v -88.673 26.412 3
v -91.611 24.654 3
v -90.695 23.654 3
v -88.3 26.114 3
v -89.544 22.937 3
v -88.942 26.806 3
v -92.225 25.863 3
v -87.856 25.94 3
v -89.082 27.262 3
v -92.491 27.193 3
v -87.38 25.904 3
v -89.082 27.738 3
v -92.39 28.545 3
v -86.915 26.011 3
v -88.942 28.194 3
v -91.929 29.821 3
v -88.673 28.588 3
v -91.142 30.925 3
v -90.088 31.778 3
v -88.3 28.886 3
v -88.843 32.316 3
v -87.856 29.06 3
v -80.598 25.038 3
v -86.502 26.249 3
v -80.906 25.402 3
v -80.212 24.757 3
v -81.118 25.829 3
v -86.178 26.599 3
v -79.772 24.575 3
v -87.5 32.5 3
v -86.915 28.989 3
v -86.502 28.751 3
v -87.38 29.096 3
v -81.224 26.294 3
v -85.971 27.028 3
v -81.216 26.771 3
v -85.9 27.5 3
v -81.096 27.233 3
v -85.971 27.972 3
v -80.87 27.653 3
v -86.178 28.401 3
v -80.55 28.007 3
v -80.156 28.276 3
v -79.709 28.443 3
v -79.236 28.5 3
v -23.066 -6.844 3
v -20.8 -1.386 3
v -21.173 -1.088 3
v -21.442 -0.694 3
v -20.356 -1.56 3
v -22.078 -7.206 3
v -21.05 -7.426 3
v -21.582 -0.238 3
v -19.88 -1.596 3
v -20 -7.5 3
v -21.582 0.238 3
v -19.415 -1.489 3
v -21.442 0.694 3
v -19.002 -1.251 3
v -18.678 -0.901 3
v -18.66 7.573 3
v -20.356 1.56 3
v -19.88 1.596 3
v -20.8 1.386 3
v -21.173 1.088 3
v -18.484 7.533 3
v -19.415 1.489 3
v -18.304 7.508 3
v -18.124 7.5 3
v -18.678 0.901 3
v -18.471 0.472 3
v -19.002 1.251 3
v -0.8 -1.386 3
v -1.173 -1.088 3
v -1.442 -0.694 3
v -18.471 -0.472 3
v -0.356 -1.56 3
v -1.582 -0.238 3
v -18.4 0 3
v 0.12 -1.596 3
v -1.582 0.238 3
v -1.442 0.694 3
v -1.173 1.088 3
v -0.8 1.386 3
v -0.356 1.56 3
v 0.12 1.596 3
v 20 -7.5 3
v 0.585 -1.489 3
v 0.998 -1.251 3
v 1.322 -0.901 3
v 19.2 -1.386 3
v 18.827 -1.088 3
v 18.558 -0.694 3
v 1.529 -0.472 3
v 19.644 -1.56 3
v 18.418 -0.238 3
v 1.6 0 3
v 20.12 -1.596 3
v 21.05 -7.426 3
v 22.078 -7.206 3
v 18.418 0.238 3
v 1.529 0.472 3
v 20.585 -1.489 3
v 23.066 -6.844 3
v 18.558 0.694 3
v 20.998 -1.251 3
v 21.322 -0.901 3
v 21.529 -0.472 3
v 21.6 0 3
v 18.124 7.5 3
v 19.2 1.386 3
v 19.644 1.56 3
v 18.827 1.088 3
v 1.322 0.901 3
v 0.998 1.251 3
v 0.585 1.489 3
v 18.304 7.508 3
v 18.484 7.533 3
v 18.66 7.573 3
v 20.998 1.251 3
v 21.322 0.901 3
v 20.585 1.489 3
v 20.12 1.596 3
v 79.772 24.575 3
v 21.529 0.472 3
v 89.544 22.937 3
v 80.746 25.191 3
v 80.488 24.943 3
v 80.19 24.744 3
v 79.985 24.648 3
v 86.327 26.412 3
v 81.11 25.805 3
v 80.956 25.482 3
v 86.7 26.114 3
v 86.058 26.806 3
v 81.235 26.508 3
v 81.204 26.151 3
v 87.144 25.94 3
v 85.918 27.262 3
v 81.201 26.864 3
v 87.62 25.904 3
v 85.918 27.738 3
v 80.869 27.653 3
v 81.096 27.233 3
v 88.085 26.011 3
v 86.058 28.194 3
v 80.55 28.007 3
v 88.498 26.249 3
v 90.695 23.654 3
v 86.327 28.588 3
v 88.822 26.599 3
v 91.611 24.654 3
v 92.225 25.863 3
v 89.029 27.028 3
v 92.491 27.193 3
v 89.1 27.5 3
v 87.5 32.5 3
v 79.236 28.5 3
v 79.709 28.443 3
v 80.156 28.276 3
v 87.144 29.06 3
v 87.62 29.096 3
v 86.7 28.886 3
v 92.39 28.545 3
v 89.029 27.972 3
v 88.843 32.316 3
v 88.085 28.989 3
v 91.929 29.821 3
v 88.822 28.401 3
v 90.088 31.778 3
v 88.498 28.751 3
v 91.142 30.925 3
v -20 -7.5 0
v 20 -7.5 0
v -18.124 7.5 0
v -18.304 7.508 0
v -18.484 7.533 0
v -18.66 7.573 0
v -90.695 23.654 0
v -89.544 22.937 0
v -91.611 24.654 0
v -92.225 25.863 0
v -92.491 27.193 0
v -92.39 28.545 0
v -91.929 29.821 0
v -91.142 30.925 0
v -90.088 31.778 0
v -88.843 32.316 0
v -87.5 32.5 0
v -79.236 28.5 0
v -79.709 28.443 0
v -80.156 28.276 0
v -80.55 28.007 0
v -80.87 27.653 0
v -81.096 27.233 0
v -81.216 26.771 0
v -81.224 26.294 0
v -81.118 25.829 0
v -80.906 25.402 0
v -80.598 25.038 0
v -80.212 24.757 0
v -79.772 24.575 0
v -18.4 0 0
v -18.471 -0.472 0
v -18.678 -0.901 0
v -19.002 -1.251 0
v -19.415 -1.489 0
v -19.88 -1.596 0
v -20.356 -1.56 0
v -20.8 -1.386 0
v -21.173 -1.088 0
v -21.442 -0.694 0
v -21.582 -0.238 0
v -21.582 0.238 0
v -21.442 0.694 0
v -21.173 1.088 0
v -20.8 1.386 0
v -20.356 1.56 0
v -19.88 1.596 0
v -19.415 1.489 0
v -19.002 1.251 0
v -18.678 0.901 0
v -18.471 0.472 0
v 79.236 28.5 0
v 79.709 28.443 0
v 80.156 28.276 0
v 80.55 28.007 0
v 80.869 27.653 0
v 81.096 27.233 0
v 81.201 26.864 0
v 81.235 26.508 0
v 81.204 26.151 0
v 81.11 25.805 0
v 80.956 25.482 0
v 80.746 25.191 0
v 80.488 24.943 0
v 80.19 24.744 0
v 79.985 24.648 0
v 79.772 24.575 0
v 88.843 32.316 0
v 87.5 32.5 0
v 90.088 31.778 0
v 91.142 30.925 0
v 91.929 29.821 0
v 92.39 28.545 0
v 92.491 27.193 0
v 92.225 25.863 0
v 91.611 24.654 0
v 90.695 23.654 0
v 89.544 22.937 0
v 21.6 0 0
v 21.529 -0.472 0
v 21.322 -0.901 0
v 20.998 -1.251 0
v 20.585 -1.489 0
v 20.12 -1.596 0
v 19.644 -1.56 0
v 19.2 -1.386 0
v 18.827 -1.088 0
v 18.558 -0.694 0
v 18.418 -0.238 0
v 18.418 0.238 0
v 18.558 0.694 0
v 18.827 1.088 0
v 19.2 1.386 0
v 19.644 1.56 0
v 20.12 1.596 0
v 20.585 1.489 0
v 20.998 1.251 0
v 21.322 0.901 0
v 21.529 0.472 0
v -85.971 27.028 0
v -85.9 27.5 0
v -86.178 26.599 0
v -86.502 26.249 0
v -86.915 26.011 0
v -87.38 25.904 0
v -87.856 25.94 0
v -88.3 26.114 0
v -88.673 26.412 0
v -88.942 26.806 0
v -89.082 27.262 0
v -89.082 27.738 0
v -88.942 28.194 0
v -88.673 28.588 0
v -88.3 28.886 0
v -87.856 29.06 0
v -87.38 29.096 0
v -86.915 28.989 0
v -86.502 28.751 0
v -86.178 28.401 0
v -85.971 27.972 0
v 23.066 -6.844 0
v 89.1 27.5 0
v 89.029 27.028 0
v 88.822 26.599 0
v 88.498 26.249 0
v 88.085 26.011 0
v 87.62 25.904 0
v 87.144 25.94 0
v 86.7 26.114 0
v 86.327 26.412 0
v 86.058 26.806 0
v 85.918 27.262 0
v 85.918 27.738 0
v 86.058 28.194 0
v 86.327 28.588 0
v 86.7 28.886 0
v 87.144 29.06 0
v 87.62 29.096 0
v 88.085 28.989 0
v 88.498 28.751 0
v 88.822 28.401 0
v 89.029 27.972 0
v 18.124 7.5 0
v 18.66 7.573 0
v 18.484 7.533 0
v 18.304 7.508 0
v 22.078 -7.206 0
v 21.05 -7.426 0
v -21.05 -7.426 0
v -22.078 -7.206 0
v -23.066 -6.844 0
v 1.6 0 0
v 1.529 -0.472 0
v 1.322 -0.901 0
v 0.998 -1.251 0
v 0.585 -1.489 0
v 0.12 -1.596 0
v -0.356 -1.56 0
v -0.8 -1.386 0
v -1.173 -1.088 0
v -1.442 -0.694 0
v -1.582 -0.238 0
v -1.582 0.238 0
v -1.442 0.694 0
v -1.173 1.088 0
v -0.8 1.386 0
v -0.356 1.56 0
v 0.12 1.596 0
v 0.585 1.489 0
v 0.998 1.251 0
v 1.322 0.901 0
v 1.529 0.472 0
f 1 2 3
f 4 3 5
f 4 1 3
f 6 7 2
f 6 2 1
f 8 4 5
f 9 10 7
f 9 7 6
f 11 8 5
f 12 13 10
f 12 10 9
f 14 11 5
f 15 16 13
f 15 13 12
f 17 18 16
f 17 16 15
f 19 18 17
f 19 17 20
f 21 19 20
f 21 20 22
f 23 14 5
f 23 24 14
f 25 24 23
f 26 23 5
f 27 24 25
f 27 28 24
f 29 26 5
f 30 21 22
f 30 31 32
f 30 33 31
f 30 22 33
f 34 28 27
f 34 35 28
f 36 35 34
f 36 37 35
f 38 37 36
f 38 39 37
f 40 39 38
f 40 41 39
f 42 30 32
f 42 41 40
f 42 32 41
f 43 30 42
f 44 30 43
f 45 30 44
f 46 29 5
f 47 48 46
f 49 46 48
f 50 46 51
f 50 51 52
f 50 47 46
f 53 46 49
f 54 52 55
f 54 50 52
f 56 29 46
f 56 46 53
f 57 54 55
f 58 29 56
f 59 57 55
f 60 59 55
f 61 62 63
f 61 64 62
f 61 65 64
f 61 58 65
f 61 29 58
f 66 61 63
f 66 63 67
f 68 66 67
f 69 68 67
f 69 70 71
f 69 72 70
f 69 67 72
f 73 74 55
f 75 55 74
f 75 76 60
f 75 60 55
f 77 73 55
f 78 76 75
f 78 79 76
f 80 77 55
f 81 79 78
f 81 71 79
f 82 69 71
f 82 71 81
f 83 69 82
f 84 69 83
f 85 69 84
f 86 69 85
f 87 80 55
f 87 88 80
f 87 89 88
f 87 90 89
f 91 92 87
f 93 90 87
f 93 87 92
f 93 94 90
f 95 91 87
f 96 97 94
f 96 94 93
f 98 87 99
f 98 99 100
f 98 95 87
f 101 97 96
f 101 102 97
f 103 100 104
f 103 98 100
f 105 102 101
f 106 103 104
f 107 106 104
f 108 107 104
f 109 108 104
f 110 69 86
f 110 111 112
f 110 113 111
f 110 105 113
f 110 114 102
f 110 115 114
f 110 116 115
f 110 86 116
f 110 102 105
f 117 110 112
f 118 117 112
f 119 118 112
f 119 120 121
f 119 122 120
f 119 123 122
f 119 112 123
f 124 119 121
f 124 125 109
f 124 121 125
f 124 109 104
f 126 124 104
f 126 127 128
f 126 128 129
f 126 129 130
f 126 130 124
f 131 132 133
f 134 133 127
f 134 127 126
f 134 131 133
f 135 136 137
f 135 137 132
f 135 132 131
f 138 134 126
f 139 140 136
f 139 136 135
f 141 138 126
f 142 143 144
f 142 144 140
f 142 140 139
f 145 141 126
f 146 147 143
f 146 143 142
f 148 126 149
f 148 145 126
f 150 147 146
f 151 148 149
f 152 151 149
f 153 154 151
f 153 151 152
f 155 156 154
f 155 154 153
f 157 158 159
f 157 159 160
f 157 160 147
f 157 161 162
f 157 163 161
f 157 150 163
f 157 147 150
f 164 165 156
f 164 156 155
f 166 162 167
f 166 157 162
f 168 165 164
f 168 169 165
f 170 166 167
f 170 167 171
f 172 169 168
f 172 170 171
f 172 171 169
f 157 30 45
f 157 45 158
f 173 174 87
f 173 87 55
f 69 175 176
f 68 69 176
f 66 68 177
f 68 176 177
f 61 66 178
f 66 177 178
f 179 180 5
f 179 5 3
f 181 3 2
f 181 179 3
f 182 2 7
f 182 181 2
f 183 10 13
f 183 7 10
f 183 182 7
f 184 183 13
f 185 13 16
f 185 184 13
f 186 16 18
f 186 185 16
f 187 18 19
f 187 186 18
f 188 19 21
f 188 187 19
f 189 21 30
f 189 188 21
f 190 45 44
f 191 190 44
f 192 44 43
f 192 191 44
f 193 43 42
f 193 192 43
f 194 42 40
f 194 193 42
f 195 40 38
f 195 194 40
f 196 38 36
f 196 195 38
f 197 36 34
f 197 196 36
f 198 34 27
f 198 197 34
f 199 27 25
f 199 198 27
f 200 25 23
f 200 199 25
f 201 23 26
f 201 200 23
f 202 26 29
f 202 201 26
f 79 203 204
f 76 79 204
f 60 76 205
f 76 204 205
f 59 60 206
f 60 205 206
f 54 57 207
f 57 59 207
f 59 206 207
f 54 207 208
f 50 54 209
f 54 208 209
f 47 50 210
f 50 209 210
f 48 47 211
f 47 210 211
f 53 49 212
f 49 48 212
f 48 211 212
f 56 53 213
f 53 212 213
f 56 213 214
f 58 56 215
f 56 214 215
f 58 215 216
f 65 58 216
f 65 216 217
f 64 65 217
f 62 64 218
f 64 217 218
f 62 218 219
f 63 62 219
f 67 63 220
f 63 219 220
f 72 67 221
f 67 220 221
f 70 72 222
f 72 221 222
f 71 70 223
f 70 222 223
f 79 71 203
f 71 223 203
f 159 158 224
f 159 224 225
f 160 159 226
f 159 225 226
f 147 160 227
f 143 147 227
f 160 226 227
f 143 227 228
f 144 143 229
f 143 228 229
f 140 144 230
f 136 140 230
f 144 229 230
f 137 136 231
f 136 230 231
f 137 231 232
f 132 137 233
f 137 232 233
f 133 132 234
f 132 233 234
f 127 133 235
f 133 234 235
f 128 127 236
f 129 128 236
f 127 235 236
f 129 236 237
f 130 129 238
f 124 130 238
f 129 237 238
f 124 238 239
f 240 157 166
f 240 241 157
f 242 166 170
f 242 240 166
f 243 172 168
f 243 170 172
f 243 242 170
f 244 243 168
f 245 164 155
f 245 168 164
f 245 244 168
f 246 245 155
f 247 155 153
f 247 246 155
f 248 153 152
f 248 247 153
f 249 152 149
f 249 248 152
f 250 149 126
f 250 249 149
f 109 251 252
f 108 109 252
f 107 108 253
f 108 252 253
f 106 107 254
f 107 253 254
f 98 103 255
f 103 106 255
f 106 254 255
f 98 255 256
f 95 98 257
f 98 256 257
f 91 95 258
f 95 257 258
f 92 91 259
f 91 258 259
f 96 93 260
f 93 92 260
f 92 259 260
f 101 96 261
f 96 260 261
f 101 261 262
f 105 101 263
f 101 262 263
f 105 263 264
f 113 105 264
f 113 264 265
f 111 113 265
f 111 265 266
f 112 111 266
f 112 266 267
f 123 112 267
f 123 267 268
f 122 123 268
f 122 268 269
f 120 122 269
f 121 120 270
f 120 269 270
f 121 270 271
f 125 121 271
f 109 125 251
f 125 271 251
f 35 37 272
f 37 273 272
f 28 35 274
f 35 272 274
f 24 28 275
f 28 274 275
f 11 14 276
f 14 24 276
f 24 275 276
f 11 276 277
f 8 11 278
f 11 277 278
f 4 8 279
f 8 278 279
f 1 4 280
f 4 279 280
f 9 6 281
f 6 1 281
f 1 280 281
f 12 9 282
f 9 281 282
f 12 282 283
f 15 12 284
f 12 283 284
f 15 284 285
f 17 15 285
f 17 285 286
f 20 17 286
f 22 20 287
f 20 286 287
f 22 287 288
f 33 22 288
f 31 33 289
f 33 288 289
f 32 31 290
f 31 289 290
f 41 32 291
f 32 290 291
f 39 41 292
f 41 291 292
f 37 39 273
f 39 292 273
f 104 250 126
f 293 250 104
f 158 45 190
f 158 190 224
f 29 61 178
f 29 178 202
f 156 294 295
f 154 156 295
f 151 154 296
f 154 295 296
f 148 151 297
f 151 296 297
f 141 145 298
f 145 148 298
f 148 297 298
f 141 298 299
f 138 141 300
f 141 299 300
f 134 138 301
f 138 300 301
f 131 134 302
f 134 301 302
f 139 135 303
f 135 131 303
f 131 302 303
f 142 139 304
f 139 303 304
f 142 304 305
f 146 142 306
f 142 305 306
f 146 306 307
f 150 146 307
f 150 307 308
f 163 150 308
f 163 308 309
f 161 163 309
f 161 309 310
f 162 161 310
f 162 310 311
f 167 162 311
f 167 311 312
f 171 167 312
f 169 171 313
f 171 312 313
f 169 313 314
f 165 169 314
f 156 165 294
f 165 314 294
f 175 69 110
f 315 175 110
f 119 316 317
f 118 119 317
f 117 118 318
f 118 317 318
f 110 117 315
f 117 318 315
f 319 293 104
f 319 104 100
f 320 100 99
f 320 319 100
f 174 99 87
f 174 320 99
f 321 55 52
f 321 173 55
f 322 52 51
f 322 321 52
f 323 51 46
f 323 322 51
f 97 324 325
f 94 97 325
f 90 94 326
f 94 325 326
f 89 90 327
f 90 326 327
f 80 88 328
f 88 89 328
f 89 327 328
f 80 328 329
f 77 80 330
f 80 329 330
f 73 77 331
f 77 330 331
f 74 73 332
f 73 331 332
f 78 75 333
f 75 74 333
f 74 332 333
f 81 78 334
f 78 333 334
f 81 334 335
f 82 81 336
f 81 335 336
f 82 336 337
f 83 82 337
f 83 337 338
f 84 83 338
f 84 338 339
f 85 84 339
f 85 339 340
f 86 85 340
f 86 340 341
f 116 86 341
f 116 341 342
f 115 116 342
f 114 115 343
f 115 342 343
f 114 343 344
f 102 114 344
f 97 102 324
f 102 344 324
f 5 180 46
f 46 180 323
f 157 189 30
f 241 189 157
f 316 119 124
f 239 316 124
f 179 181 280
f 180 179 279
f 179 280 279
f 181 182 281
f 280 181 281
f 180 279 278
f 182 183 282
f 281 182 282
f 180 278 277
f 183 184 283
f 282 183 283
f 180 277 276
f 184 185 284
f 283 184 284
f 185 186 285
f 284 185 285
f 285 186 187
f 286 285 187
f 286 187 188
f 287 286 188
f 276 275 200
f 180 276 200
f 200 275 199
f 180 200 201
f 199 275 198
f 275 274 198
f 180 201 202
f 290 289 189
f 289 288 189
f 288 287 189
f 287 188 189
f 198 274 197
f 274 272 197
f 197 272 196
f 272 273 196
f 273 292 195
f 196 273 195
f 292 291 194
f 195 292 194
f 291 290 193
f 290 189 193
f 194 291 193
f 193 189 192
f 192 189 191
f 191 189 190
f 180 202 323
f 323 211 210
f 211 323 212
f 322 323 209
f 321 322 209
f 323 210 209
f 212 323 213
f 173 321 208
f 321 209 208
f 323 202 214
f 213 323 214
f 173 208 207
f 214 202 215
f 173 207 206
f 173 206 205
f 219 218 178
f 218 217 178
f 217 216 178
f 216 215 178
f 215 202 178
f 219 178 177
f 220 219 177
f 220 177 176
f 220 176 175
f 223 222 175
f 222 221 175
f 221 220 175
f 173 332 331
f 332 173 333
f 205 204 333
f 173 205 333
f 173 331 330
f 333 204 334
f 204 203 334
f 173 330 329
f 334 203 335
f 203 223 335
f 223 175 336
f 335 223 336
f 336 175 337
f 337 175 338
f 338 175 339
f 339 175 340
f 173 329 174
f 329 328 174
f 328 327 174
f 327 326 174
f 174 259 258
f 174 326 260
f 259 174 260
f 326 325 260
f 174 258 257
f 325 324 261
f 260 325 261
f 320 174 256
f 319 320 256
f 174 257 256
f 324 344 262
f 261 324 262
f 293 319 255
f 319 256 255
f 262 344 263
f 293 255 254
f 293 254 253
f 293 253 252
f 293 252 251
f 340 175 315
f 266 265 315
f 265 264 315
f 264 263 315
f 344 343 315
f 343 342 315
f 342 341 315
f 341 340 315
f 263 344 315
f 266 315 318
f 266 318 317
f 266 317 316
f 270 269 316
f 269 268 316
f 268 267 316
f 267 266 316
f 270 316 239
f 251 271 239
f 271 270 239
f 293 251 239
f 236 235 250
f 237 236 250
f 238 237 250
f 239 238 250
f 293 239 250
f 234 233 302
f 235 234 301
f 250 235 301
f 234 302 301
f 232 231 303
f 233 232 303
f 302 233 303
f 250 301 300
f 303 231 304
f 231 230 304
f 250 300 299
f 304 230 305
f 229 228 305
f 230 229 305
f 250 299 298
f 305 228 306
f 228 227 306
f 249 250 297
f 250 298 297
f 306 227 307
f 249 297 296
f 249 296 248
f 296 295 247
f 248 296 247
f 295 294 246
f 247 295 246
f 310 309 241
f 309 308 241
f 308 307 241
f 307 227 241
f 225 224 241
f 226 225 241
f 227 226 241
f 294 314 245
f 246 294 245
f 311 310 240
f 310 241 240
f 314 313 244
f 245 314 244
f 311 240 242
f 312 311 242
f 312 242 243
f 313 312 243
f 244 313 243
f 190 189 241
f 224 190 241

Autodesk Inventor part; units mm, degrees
ref_plane "YZ Plane" through (0, 0, 0) normal (1, 0, 0) x (0, 1, 0)
ref_plane "XZ Plane" through (0, 0, 0) normal (0, 1, 0) x (-1, 0, 0)
ref_plane "XY Plane" through (0, 0, 0) normal (0, 0, 1) x (1, 0, 0)
sketch "スケッチ1" plane through (0, 0, 0) normal (0, 0, 1) x (1, 0, 0)
  circle A0 centre (-20, 0) radius 1.6
  circle A1 centre (20, 0) radius 1.6
  circle A2 centre (0, 0) radius 1.6
  circle A3 centre (-87.5, 27.5) radius 1.6
  circle A4 centre (87.5, 27.5) radius 1.6
  arc A5 (-87.5, 32.5) -> (-89.5442, 22.937) centre (-87.5, 27.5) ccw
  arc A6 (89.5442, 22.937) -> (87.5, 32.5) centre (87.5, 27.5) ccw
  arc A7 (20, -7.5) -> (23.0663, -6.8445) centre (20, 0) ccw
  arc A8 (-23.0663, -6.8445) -> (-20, -7.5) centre (-20, 0) ccw
  line L0 (-89.5442, 22.937) -> (-23.0663, -6.8445)
  line L1 (-87.5, 32.5) -> (87.5, 32.5)
  line L2 (89.5442, 22.937) -> (23.0663, -6.8445)
  line L3 (20, -7.5) -> (-20, -7.5)
  dimension "d0" = 3.2
  dimension "d1" = 3.2
  dimension "d2" = 3.2
  dimension "d3" = 20
  dimension "d4" = 20
  dimension "d5" = 3.2
  dimension "d6" = 3.2
  dimension "d14" = 175
  dimension "d15" = 87.5
  dimension "d17" = 5
  dimension "d18" = 5
  dimension "d19" = 7.5
  dimension "d20" = 7.5
  dimension "d23" = 27.5
extrude "押し出し1" add sketch "スケッチ1" along normal blind 3
sketch "スケッチ2" plane through (0, 0, 3) normal (0, 0, 1) x (1, 0, 0)
  circle A0 centre (-87.5, 27.5) radius 1.6 projected
  arc A1 (-82.937, 25.4558) -> (-82.601, 28.5) centre (-87.5, 27.5) ccw
  circle A2 centre (87.5, 27.5) radius 1.6 projected
  arc A3 (82.601, 28.5) -> (82.937, 25.4558) centre (87.5, 27.5) ccw
  line L0 (-82.601, 28.5) -> (82.601, 28.5)
  line L1 (87.5, 32.5) -> (-87.5, 32.5) projected
  line L2 (-18.3968, 7.5) -> (18.3968, 7.5)
  line L3 (18.3968, 7.5) -> (82.937, 25.4558)
  line L4 (-18.3968, 7.5) -> (-82.937, 25.4558)
  line L5 (-20, -7.5) -> (20, -7.5) projected
  line L6 (-89.5442, 22.937) -> (-23.0663, -6.8445) projected
  line L7 (23.0663, -6.8445) -> (89.5442, 22.937) projected
  point P0 (0, 0)
  dimension "d24" = 5
  dimension "d25" = 5
  dimension "d26" = 4
  dimension "d27" = 15
  dimension "d28" = 15
  dimension "d29" = 15
  dimension "d30" = 5
  dimension "d31" = 5
extrude "押し出し2" cut sketch "スケッチ2" against normal through all contours A1 L0 A3 L3 L2 L4
fillet "フィレット1" radius 2 6 edges at (-82.601, 28.5, 1.5) (-82.937, 25.4558, 1.5) (-18.3968, 7.5, 1.5) (18.3968, 7.5, 1.5) (82.601, 28.5, 1.5) (82.937, 25.4558, 1.5)
equation "\"d15\" = 0.5 * d14"
properties part number "ハンド_上側板" material "アルミニウム 6061"
